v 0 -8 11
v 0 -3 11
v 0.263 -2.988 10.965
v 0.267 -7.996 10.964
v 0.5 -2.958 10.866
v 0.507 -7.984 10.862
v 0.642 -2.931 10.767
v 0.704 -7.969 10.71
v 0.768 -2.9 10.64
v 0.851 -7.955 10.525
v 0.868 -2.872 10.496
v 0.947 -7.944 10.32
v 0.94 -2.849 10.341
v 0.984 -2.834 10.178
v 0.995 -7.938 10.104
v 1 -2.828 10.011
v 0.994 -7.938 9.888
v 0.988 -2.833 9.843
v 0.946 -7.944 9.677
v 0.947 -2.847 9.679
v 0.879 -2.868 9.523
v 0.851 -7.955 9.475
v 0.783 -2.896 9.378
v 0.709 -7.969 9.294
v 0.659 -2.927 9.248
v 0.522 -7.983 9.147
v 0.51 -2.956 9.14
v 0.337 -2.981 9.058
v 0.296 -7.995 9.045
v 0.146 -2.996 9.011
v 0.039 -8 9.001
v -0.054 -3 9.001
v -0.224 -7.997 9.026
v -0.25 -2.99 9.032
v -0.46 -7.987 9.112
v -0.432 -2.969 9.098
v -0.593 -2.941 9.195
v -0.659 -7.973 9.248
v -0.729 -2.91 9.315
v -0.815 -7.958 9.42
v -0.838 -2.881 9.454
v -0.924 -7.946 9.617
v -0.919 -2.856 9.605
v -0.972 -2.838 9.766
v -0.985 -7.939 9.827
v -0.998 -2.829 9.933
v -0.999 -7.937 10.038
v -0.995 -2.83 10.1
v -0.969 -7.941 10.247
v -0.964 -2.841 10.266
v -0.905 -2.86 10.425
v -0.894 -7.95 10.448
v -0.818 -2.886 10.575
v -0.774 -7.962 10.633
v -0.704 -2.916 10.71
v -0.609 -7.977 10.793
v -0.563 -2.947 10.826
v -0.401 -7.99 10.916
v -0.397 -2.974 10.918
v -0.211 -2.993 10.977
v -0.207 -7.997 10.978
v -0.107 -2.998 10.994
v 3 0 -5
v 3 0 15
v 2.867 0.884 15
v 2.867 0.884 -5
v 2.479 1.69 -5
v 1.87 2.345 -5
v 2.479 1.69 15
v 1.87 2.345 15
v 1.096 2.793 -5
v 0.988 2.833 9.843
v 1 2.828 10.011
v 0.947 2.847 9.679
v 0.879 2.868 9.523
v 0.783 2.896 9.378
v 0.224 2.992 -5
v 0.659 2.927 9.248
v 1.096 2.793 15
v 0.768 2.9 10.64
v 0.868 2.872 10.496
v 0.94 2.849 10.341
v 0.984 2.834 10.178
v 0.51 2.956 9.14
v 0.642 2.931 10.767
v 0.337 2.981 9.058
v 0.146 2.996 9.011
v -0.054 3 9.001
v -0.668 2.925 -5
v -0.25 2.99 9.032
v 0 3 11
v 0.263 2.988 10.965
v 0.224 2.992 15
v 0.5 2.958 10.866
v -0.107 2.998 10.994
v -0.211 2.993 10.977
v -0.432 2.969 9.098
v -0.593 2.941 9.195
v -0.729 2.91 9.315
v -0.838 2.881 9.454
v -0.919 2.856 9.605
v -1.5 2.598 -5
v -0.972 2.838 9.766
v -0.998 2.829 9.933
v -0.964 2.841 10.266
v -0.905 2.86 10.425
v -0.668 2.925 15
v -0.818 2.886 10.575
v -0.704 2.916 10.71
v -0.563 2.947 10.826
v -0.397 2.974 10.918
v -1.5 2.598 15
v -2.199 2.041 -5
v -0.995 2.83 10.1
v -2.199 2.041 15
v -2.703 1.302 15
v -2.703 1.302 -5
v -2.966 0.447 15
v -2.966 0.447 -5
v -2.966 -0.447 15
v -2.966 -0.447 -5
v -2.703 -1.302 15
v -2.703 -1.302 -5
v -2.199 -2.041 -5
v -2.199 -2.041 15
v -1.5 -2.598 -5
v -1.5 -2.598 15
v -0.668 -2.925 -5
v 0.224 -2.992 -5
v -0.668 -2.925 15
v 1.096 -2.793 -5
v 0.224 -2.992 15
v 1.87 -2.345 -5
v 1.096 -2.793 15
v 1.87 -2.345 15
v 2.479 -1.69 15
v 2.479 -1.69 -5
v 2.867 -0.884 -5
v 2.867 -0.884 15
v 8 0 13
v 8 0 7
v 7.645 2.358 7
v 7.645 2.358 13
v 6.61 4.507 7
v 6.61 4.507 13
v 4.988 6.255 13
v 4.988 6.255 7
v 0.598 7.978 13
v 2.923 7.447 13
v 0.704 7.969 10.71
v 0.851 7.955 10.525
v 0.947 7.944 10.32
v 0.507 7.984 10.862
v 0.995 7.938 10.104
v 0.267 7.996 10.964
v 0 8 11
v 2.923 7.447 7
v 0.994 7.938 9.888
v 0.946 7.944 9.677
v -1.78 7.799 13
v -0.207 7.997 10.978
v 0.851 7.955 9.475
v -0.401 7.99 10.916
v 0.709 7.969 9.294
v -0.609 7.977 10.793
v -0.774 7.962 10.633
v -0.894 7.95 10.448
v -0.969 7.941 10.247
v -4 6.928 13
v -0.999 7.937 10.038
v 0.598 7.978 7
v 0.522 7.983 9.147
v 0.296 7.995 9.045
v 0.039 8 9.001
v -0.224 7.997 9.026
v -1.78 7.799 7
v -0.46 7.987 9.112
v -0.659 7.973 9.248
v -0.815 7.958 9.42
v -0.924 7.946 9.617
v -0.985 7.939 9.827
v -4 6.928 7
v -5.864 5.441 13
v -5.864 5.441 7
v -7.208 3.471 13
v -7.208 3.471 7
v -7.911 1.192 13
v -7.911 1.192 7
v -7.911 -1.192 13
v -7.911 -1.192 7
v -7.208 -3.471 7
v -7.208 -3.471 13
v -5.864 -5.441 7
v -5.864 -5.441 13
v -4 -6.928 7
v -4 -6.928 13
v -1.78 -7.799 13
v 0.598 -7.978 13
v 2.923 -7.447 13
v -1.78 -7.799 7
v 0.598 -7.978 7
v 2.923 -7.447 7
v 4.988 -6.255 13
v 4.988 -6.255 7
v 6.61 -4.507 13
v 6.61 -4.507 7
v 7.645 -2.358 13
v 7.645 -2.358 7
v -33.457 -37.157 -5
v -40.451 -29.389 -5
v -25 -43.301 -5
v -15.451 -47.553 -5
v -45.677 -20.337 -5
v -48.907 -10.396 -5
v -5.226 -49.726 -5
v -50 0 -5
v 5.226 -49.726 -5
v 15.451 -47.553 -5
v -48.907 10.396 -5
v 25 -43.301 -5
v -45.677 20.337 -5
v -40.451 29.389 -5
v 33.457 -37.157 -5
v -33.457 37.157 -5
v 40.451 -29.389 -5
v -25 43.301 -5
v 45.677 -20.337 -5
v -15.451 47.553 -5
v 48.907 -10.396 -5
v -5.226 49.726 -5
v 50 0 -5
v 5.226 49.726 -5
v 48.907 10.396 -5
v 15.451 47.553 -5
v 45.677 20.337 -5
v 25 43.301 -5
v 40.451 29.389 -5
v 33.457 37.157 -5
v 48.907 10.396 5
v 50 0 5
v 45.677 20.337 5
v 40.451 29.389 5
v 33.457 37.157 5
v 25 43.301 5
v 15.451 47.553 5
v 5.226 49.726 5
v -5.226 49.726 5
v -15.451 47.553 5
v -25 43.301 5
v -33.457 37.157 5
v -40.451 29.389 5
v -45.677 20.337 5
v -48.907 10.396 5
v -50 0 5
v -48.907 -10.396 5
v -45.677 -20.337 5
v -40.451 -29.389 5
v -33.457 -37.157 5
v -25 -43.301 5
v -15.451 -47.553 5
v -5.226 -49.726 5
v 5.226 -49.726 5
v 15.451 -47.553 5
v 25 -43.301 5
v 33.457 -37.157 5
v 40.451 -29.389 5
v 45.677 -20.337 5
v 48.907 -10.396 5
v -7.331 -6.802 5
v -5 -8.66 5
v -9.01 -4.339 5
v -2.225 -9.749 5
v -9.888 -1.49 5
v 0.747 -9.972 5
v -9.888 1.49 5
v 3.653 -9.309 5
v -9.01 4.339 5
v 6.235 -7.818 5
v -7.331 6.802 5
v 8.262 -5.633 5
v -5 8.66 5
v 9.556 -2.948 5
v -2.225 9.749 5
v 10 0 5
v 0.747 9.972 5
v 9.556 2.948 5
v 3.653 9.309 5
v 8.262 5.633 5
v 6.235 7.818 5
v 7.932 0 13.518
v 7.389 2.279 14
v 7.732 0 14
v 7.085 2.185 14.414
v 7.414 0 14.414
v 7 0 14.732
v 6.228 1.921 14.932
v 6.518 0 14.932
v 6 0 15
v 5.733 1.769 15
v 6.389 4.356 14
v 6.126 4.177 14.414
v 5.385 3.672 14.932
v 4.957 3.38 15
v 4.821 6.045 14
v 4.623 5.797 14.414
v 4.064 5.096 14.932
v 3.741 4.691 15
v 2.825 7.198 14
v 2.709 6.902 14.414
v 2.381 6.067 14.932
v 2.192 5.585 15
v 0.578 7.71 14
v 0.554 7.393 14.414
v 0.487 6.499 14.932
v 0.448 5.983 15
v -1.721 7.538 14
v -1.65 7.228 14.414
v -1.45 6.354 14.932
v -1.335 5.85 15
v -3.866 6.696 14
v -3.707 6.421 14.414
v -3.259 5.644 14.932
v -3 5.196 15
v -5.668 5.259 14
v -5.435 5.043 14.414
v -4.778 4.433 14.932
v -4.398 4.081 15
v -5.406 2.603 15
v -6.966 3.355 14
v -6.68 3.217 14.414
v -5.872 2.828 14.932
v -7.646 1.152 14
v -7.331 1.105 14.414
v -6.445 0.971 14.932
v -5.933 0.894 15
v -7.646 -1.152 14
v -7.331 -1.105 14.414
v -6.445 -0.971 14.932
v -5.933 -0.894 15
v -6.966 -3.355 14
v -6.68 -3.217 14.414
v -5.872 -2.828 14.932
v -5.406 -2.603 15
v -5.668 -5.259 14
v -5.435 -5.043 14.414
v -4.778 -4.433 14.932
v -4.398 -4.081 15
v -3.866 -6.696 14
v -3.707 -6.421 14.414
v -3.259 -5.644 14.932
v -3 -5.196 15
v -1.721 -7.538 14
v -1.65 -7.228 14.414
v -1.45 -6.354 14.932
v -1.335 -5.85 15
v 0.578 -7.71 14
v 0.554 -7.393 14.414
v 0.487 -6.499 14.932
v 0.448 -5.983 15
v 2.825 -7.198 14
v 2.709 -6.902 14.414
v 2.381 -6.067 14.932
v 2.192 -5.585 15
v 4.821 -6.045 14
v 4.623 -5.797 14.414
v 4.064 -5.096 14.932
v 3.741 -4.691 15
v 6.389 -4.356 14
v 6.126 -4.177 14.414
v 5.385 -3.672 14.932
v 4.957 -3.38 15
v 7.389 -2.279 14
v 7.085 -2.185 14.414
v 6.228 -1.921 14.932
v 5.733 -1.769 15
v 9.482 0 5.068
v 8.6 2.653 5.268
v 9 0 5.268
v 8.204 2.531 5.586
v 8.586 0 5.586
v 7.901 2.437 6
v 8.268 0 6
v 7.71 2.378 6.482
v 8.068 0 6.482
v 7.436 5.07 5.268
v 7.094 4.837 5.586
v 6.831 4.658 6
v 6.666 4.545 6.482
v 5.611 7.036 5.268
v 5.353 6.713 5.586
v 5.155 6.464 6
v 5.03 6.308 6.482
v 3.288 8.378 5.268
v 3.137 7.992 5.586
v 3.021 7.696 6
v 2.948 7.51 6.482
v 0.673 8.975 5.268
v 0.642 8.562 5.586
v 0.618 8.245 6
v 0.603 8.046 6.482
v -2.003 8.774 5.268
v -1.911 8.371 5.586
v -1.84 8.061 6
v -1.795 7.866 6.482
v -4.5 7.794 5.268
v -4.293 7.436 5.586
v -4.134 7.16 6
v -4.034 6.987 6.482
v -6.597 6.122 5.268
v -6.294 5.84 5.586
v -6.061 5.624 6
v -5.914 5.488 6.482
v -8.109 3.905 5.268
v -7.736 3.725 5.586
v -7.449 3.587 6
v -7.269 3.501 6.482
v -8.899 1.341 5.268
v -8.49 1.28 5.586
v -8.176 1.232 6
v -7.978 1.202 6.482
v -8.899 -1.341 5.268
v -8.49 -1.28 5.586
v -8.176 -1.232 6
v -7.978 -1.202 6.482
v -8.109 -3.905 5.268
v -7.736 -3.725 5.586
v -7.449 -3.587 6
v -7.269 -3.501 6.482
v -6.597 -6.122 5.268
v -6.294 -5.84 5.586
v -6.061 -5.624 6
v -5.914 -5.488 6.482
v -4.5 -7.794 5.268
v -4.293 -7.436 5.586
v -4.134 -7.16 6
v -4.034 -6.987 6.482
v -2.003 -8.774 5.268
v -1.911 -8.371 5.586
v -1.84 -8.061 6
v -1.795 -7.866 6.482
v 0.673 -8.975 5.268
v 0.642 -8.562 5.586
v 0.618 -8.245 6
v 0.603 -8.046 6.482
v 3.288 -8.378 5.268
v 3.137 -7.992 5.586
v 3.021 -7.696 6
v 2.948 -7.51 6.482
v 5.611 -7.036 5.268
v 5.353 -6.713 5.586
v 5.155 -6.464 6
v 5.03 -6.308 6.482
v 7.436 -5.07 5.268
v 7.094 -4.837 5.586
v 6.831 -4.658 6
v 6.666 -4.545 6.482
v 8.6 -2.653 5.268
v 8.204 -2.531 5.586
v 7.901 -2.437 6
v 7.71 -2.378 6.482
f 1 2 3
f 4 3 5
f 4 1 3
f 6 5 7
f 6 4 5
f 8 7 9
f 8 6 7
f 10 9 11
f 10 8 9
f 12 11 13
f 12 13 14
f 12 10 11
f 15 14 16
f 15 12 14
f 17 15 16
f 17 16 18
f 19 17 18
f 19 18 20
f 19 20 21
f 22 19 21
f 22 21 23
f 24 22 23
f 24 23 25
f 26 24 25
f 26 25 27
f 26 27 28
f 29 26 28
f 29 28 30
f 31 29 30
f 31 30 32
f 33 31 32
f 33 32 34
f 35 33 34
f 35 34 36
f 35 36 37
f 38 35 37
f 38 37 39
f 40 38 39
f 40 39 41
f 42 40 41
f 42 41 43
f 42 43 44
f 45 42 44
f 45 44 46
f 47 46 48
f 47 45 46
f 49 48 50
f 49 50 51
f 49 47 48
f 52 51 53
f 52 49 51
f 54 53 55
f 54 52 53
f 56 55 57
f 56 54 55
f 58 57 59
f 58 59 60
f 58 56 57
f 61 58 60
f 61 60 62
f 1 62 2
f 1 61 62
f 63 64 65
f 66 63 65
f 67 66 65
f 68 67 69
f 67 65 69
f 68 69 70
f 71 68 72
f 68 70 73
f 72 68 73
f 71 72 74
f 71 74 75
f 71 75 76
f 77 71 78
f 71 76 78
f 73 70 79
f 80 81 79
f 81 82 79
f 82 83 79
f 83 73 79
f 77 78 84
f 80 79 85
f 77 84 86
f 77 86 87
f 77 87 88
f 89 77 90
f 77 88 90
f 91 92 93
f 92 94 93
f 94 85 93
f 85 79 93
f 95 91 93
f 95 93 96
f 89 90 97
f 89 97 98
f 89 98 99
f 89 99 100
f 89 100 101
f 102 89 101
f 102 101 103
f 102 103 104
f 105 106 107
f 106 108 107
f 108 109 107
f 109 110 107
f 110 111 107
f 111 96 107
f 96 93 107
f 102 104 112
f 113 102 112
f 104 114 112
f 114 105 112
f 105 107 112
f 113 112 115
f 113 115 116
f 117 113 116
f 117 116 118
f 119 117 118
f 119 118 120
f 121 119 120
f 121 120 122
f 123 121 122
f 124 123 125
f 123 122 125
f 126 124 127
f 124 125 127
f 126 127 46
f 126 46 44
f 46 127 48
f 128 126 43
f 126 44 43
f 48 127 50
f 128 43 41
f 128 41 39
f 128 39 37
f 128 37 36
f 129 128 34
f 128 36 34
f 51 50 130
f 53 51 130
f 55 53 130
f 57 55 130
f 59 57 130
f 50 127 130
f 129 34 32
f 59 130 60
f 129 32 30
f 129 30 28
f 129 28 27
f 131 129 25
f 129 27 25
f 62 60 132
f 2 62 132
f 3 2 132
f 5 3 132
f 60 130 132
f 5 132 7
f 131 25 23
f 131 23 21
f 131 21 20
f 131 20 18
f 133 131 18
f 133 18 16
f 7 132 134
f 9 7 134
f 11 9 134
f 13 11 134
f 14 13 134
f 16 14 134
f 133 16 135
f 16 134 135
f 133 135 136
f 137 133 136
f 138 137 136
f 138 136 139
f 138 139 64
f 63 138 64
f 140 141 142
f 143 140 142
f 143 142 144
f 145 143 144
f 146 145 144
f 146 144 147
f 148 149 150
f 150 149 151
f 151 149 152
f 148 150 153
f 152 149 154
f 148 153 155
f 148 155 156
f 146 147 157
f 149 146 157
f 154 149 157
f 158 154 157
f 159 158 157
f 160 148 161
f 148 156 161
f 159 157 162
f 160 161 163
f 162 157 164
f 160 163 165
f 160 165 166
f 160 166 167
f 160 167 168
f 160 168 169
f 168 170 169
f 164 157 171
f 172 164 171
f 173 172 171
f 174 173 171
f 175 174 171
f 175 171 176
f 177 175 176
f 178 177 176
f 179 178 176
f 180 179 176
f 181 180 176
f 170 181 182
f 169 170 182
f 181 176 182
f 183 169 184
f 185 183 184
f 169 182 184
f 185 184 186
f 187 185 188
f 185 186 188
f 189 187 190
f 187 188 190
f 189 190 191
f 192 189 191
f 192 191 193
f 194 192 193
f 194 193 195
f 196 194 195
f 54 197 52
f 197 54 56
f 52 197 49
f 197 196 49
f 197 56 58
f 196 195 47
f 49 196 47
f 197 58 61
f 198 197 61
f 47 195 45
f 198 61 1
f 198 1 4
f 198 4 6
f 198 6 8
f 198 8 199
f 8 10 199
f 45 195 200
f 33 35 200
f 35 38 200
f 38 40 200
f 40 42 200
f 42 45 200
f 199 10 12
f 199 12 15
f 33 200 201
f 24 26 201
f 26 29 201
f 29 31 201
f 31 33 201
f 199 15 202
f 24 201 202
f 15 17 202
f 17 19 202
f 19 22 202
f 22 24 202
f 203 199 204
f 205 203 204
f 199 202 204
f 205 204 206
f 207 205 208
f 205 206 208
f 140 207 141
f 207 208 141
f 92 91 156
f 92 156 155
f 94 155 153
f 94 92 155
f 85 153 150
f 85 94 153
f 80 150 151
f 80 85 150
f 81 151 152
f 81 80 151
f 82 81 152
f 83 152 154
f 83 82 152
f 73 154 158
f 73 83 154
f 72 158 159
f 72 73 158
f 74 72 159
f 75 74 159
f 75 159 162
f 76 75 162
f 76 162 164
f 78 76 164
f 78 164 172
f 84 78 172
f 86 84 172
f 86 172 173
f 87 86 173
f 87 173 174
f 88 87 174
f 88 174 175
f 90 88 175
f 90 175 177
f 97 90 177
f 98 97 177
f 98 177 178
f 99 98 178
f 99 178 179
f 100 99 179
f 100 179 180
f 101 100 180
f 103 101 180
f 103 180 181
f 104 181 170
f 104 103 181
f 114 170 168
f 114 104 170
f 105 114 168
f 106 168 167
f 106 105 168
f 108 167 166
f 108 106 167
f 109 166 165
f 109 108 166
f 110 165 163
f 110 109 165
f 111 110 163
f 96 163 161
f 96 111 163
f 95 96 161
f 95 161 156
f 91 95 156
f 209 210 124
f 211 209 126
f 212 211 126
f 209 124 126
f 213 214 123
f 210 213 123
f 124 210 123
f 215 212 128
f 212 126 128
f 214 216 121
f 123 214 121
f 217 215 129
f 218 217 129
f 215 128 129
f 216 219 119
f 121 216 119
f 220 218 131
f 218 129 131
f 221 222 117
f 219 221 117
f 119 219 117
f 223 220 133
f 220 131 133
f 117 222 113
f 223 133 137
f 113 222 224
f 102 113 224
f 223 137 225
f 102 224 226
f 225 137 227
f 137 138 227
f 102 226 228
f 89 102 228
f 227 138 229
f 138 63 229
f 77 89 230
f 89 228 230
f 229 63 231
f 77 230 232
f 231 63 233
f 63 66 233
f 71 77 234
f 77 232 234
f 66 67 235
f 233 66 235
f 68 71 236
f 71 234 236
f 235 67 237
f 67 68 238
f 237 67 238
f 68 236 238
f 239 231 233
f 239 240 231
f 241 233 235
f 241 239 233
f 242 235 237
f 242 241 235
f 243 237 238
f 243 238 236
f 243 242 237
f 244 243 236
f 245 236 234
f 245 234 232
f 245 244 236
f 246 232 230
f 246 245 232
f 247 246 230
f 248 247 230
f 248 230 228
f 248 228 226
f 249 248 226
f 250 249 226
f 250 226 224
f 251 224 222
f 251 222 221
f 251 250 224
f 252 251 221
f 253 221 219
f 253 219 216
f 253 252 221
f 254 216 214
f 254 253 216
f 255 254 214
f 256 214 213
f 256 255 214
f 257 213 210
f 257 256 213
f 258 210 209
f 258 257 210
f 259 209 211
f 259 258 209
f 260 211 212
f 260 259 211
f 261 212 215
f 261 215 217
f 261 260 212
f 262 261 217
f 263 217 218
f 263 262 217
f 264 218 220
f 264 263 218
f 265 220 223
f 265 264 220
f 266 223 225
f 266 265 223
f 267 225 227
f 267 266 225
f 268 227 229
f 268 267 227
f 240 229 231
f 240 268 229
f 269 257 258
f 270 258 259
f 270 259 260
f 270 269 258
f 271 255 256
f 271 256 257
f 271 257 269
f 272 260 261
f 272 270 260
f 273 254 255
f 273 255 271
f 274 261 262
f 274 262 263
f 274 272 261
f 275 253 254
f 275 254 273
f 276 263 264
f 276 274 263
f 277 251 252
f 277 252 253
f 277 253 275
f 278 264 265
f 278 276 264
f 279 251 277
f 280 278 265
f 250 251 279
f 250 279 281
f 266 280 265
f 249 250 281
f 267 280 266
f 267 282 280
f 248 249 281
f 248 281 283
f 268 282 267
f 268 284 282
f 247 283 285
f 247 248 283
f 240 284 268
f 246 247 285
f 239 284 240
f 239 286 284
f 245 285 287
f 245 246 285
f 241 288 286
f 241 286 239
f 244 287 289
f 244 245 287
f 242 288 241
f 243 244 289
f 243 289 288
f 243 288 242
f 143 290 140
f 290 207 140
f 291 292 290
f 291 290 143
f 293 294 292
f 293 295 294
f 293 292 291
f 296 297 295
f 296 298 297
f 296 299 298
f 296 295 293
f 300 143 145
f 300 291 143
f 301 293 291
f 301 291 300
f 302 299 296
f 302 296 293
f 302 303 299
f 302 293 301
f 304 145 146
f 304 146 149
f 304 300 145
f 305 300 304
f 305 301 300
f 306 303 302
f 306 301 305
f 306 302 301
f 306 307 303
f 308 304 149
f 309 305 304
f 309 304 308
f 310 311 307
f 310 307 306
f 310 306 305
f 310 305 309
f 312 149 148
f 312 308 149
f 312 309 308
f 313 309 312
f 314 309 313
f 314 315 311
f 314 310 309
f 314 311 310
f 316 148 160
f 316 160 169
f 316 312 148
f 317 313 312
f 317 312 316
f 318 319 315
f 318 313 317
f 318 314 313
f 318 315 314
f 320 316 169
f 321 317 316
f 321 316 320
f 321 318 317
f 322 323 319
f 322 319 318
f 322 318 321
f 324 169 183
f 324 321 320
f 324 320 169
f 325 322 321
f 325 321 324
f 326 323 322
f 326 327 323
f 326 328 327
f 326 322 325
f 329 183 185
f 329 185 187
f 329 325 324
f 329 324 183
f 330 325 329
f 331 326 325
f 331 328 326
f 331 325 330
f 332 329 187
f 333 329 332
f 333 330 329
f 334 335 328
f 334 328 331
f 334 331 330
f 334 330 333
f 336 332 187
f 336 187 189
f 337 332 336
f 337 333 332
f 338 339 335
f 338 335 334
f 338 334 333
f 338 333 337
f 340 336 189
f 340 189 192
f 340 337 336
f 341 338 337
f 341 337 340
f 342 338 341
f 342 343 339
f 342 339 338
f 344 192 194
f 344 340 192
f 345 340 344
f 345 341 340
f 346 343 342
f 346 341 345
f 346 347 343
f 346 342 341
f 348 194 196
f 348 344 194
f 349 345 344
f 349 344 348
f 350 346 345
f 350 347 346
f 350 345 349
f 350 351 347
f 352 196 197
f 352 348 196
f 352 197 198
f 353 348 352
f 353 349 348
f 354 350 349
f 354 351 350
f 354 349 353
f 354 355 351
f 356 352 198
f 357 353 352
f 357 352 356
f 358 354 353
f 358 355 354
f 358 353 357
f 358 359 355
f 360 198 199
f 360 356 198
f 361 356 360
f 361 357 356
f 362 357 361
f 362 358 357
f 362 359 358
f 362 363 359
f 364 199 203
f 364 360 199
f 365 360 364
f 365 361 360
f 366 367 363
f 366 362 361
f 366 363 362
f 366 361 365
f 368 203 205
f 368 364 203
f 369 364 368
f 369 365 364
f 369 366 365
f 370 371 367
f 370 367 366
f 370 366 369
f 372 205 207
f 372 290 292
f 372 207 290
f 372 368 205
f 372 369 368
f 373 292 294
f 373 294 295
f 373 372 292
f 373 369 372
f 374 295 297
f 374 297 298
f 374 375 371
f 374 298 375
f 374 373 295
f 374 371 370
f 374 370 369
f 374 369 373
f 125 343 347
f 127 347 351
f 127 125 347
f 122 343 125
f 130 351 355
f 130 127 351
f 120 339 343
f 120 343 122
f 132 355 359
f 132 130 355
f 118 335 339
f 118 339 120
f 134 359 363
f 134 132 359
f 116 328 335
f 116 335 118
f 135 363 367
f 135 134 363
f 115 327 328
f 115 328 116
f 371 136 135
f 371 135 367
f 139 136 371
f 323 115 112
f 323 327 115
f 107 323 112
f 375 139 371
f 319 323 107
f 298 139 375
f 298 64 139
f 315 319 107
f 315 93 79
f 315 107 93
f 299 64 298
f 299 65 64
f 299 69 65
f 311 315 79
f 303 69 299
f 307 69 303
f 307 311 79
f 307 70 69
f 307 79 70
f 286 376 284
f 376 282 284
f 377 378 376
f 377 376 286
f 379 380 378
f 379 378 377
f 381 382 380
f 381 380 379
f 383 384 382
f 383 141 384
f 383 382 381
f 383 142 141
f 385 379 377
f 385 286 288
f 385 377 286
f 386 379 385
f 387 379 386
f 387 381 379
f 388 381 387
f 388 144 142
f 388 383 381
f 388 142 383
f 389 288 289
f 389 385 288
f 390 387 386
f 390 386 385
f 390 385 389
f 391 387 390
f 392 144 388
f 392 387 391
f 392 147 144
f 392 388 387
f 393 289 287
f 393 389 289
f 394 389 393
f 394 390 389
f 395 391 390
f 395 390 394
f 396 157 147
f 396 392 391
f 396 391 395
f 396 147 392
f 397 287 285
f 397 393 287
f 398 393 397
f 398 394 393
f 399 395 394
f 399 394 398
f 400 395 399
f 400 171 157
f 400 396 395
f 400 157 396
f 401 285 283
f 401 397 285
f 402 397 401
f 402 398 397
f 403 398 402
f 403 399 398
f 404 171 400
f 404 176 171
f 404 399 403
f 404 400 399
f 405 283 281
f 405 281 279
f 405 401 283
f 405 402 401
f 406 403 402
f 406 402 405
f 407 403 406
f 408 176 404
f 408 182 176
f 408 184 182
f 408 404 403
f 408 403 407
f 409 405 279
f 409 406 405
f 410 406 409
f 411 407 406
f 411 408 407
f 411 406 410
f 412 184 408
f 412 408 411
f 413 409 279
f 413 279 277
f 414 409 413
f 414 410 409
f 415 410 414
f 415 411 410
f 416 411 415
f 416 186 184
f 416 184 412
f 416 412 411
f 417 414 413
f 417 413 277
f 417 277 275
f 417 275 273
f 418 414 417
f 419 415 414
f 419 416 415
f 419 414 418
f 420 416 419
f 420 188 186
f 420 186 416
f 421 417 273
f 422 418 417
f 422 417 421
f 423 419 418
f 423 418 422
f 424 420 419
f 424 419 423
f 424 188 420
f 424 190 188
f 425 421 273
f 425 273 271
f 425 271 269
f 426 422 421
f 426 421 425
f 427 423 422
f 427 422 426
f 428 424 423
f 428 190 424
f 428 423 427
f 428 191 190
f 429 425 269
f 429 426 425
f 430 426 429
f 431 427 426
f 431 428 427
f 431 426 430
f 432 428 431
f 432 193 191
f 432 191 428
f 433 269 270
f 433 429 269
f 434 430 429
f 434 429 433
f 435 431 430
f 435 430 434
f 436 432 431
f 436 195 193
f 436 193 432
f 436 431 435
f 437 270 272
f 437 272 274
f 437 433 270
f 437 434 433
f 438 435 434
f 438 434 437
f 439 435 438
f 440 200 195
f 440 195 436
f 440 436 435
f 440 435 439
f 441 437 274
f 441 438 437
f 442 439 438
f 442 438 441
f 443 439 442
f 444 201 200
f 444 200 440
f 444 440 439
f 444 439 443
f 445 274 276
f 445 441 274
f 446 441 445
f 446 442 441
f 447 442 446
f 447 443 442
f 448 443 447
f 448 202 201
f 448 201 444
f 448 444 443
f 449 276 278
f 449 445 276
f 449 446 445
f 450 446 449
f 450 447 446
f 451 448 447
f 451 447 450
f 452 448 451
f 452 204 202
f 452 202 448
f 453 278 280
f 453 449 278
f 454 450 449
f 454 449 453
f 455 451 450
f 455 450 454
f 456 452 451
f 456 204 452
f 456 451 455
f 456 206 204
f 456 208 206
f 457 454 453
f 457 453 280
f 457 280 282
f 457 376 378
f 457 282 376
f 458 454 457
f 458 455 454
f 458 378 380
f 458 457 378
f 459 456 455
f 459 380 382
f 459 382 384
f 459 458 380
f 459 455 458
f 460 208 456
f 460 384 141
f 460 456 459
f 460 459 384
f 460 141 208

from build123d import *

# Parameters (mm, degrees)
SKETCH1_R               = 50
BOSS_EXTRUDE1_DEPTH     = 5
SKETCH2_R               = 8
BOSS_EXTRUDE2_DEPTH     = 10
SKETCH3_R               = 3
CUT_EXTRUDE1_DEPTH      = 74.484692283
FILLET1_R               = 2
CUT_EXTRUDE2_DEPTH      = 73.284161474
CUT_EXTRUDE2_DEPTH_BACK = 73.284161474
SKETCH4_R               = 1


with BuildPart() as part:
    # Sketch1 → Boss-Extrude1 (new, symmetric)
    with BuildSketch(Plane.XY):
        Circle(SKETCH1_R)
    extrude(amount=BOSS_EXTRUDE1_DEPTH, both=True)

    # Sketch2 → Boss-Extrude2 (add)
    with BuildSketch(Plane.XY.offset(5)):
        Circle(SKETCH2_R)
    extrude(amount=BOSS_EXTRUDE2_DEPTH)

    # Sketch3 → Cut-Extrude1 (cut, through all)
    with BuildSketch(Plane.XY.offset(15)):
        Circle(SKETCH3_R)
    extrude(amount=-CUT_EXTRUDE1_DEPTH, mode=Mode.SUBTRACT)

    # Fillet1
    fillet1_edges = [part.edges().sort_by_distance(p)[0] for p in [
        (-8, 0, 5),
        (-8, 0, 15),
    ]]
    fillet(fillet1_edges, radius=FILLET1_R)

    # Sketch4 → Cut-Extrude2 (cut, two sides: drawn at the far end of the back side and taken through both)
    with BuildSketch(Plane(origin=(0, 0, 0), x_dir=(1, 0, 0), z_dir=(0, 1, 0)).offset(-CUT_EXTRUDE2_DEPTH_BACK)):
        with Locations(Location((0, -10, 0), (0, 0, 270))):
            Circle(SKETCH4_R)
    extrude(amount=CUT_EXTRUDE2_DEPTH + CUT_EXTRUDE2_DEPTH_BACK, mode=Mode.SUBTRACT)


solid = part.part
